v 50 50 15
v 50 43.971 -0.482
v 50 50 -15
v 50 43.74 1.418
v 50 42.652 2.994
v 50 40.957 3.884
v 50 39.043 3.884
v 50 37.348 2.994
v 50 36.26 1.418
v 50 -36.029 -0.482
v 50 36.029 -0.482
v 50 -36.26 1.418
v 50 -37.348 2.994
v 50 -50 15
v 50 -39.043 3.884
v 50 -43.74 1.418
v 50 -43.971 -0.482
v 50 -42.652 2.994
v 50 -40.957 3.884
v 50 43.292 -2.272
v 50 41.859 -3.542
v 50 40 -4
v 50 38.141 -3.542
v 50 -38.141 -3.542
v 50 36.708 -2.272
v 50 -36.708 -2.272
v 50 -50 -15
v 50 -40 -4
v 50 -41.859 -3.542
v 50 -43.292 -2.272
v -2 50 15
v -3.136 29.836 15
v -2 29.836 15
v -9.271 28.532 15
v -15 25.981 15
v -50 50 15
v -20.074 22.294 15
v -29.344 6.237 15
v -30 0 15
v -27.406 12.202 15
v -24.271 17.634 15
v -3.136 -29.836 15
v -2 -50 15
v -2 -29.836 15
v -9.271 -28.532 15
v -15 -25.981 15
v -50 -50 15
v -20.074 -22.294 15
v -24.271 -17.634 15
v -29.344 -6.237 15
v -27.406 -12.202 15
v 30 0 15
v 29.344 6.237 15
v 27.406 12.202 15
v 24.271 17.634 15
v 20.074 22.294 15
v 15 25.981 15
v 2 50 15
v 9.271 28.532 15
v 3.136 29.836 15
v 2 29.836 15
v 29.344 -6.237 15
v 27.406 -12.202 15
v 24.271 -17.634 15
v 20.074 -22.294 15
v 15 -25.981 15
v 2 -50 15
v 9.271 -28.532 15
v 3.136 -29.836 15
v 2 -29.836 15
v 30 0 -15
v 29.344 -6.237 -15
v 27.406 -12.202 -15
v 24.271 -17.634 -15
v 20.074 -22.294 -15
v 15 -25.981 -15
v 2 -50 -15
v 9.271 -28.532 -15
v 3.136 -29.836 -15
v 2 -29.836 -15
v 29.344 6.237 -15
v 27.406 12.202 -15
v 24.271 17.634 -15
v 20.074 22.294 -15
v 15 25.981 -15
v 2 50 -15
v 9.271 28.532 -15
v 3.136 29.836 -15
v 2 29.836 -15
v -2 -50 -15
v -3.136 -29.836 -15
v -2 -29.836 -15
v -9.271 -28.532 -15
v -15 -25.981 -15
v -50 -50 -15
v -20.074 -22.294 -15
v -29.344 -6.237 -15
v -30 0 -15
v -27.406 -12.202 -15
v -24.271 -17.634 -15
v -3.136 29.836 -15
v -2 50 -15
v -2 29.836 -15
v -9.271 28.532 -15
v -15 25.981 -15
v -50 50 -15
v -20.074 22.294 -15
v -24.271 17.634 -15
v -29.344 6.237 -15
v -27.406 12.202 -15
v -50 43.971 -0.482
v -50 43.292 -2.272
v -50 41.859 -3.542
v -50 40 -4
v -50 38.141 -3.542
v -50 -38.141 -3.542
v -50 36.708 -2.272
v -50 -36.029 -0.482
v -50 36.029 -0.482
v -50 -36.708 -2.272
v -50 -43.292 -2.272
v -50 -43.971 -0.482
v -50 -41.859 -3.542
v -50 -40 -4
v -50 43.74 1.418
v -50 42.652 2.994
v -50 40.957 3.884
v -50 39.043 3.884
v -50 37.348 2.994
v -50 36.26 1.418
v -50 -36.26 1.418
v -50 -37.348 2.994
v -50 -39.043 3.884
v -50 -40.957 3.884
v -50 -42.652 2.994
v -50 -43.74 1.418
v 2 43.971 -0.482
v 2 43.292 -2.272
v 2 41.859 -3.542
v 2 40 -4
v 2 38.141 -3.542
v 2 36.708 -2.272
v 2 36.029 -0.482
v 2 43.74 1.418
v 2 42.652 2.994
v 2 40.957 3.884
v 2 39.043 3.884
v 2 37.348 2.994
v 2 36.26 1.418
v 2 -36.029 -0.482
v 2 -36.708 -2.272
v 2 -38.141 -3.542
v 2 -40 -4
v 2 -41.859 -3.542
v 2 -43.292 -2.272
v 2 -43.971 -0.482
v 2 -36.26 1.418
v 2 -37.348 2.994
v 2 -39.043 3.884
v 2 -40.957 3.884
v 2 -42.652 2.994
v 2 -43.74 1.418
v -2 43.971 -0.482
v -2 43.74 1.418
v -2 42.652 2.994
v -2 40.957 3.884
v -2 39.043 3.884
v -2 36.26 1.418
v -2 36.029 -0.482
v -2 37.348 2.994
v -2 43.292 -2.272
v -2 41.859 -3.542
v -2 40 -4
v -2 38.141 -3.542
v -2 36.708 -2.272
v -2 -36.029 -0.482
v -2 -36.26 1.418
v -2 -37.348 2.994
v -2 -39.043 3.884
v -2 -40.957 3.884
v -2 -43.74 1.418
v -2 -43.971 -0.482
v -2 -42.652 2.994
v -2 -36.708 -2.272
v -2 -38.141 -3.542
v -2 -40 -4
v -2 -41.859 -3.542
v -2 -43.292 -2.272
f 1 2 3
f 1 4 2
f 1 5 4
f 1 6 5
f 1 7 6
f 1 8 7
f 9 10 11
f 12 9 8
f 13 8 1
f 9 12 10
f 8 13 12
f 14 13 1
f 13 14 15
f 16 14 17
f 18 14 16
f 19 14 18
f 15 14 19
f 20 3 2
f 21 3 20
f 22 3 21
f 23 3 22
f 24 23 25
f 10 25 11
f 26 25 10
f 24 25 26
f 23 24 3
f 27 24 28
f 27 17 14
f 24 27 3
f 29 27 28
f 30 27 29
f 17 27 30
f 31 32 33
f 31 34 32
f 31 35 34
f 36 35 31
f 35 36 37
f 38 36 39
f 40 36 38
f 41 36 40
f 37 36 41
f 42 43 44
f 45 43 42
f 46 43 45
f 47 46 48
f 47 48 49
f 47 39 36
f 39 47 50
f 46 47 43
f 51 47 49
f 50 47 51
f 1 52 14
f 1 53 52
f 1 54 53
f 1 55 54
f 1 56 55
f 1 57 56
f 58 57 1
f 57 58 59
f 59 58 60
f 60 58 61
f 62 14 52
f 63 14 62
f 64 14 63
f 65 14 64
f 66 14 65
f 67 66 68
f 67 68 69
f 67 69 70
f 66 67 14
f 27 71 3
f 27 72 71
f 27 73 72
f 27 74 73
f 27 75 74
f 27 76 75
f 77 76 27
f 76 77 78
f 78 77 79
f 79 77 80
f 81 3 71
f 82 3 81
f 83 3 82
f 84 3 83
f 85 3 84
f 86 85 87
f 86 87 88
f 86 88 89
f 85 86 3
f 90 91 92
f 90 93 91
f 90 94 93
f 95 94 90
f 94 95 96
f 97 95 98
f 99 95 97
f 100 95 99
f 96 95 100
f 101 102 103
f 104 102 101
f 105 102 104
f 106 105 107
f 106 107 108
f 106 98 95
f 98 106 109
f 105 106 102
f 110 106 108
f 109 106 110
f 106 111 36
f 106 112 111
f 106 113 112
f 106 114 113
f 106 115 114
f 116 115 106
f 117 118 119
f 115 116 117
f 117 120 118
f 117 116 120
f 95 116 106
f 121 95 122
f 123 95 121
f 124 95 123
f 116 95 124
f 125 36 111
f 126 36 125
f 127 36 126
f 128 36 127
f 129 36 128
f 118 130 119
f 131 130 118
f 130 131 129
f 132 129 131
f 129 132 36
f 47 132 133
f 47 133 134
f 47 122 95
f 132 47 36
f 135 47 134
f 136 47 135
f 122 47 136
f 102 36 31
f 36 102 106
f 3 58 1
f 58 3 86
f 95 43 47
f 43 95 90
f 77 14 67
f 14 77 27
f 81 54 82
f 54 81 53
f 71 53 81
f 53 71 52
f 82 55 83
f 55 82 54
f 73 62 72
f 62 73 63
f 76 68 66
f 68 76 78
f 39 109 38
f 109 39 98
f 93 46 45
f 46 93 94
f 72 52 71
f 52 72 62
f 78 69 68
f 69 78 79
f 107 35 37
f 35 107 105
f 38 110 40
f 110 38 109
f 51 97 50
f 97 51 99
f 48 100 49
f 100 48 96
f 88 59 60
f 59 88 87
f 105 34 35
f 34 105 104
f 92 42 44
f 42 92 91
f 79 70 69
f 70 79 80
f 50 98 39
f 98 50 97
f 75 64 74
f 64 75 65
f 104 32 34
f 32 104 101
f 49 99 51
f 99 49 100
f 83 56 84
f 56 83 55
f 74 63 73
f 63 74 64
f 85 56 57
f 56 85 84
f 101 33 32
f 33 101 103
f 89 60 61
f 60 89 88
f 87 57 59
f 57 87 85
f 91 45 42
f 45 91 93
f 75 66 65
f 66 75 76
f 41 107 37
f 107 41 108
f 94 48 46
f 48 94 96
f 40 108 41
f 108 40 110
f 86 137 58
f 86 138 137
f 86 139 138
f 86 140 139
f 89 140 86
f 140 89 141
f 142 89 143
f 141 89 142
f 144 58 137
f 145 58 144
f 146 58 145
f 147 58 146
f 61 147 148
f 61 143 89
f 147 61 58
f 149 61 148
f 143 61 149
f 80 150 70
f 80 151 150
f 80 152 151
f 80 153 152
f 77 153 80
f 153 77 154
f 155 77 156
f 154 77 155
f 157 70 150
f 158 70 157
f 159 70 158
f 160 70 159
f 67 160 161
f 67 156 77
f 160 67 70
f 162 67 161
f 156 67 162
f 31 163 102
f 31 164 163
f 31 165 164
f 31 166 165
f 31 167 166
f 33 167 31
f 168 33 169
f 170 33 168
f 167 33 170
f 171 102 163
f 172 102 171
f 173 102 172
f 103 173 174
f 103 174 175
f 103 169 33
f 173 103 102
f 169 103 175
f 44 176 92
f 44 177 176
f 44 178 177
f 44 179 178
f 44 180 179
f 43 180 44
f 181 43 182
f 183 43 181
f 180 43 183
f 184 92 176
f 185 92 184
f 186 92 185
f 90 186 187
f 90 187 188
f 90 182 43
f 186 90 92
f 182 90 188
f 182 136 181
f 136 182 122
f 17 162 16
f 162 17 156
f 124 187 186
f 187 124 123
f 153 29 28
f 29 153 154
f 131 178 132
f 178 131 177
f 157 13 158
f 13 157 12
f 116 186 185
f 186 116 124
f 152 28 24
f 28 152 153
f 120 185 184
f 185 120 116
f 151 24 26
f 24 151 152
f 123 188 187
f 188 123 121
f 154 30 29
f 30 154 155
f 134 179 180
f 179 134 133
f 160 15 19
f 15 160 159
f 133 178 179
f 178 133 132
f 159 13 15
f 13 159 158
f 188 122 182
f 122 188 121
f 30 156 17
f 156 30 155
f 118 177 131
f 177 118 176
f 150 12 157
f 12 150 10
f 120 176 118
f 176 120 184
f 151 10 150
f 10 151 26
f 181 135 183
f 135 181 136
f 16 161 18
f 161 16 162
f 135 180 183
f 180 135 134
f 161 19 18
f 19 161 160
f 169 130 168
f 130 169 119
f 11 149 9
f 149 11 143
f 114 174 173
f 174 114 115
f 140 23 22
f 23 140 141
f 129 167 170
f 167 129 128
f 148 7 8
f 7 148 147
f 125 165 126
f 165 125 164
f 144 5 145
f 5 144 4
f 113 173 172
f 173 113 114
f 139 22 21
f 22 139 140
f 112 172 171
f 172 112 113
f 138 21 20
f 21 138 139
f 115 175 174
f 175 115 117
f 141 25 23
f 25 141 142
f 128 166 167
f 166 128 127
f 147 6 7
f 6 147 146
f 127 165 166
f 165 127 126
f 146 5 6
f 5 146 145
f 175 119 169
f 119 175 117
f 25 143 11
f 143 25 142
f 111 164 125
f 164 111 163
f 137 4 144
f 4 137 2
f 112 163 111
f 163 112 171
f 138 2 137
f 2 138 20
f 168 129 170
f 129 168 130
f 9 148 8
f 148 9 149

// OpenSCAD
module ring()
{
        translate([0, 0, -35]) // center
        color("red") {
                
                difference() {
                        union() {
                                cylinder(r=50, h=70);
                                // straight extensions tangent to round border  
                                translate([0, -50, 0])
                                        cube([50, 100, 70]);
                                // fixation block
                                translate([30, -80, 0])
                                        cube([50, 160, 70]);
                                // extension for the thightening screw
                                translate([-50, 2, 25])
                                        cube([20, 37.5, 20]);
                                
                                translate([-50, -2-37.5, 25])
                                        cube([20, 37.5, 20]);
                        }
                        // center hole
                        translate([0, 0, -1])
                                cylinder(r=30, h=72);
                        // cut-out for fixation block
                        translate([50, -81, 20])
                                cube([31, 162, 30]);

                        // vertical fixtion screw
                        translate([65, 0, -1])
                                cylinder(r=4, h=72);

                        // two horizontal fixtion screw
                        translate([30, 65, 35])
                                rotate([0, 90, 0])
                                translate([0, 0, -1])
                                cylinder(r=4, h=22);
                        translate([30, -65, 35])
                                rotate([0, 90, 0])
                                translate([0, 0, -1])
                                cylinder(r=4, h=22);

                        // opening for thightening
                        translate([-51, -2, -1])
                                cube([22, 4, 72]);

                        // opening for thightening screw
                        translate([-40, 40, 35])
                                rotate([90, 0, 0])
                                translate([0, 0, -1])
                                cylinder(r=3.5, h=82);
                }
        }
}

module ring2()
{
        translate([-50, -50, -15]) // center
        color("lightgray") {
                difference() {
                        translate([0, 0, 0])
                                cube([100, 100, 30]);
                        // center hole
                        translate([50, 50, -1])
                                cylinder(r=30, h=52);
                        // slit
                        translate([48, -1, -1])
                                cube([4, 102, 32]);
                        // hole for thightening screws
                        translate([-1, 10, 15])
                                rotate([0, 90, 0])
                                cylinder(r=4, h=102);
                        translate([-1, 90, 15])
                                rotate([0, 90, 0])
                                cylinder(r=4, h=102);
                }
        }        
}

*ring();

ring2();
